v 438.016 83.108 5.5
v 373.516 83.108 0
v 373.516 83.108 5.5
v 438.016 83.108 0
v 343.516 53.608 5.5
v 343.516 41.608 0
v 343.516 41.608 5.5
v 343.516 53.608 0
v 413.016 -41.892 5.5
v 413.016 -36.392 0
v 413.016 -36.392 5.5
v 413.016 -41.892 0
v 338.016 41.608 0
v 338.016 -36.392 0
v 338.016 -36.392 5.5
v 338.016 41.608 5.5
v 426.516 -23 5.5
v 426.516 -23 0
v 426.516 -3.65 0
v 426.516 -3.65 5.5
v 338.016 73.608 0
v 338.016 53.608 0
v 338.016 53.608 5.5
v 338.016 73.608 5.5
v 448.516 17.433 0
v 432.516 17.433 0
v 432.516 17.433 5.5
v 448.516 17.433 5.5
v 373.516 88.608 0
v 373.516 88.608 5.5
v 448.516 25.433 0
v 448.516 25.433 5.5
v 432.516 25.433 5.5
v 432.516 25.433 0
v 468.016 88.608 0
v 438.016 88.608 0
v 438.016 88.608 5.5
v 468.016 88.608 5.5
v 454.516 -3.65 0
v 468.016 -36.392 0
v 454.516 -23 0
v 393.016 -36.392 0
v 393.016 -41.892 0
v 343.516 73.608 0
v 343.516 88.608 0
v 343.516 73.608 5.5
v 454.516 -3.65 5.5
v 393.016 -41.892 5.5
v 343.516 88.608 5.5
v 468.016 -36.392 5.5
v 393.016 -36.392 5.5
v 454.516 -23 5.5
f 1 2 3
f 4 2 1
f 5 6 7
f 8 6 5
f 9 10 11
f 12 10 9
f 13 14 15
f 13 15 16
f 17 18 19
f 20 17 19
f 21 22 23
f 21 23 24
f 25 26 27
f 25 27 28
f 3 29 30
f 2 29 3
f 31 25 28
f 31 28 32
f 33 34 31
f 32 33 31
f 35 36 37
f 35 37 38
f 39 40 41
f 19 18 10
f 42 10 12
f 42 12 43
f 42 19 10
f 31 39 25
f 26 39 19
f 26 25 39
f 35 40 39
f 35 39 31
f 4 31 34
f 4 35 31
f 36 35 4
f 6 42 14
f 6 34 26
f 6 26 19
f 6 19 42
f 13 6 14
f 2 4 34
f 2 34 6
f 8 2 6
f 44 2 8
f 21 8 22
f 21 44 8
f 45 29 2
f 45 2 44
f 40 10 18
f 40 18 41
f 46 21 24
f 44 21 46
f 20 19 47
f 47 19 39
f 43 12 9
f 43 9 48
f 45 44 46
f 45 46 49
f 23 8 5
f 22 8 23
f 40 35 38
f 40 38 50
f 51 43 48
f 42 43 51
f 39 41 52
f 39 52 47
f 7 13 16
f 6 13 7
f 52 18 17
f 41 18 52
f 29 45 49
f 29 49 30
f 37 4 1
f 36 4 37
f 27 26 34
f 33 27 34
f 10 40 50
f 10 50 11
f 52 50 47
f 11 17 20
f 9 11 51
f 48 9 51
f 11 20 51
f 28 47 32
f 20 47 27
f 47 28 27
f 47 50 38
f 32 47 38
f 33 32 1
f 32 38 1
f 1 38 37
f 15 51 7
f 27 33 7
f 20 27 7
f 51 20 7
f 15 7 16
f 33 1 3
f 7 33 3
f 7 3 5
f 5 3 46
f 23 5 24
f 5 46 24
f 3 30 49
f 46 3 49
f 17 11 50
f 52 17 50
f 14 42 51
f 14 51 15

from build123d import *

# Parameters (mm, degrees)
CROQUIS1_W              = 28
CROQUIS1_H              = 19.35
CROQUIS1_W_2            = 16
CROQUIS1_H_2            = 8
SALIENTE_EXTRUIR1_DEPTH = 5.5


with BuildPart() as part:
    # Croquis1 → Saliente-Extruir1 (new body)
    with BuildSketch(Plane.XY):
        Polygon((468.016438709, 88.608229285), (468.016438709, -36.391770715), (413.016438709, -36.391770715), (413.016438709, -41.891770715), (393.016438709, -41.891770715), (393.016438709, -36.391770715), (338.016438709, -36.391770715), (338.016438709, 41.608229285), (343.516438709, 41.608229285), (343.516438709, 53.608229285), (338.016438709, 53.608229285), (338.016438709, 73.608229285), (343.516438709, 73.608229285), (343.516438709, 88.608229285), (373.516438709, 88.608229285), (373.516438709, 83.108229285), (438.016438709, 83.108229285), (438.016438709, 88.608229285), align=None)
        with Locations((440.516438709, -13.325)):
            Rectangle(CROQUIS1_W, CROQUIS1_H, mode=Mode.SUBTRACT)
        with Locations((440.516438709, 21.433223203)):
            Rectangle(CROQUIS1_W_2, CROQUIS1_H_2, mode=Mode.SUBTRACT)
    extrude(amount=SALIENTE_EXTRUIR1_DEPTH)


solid = part.part
